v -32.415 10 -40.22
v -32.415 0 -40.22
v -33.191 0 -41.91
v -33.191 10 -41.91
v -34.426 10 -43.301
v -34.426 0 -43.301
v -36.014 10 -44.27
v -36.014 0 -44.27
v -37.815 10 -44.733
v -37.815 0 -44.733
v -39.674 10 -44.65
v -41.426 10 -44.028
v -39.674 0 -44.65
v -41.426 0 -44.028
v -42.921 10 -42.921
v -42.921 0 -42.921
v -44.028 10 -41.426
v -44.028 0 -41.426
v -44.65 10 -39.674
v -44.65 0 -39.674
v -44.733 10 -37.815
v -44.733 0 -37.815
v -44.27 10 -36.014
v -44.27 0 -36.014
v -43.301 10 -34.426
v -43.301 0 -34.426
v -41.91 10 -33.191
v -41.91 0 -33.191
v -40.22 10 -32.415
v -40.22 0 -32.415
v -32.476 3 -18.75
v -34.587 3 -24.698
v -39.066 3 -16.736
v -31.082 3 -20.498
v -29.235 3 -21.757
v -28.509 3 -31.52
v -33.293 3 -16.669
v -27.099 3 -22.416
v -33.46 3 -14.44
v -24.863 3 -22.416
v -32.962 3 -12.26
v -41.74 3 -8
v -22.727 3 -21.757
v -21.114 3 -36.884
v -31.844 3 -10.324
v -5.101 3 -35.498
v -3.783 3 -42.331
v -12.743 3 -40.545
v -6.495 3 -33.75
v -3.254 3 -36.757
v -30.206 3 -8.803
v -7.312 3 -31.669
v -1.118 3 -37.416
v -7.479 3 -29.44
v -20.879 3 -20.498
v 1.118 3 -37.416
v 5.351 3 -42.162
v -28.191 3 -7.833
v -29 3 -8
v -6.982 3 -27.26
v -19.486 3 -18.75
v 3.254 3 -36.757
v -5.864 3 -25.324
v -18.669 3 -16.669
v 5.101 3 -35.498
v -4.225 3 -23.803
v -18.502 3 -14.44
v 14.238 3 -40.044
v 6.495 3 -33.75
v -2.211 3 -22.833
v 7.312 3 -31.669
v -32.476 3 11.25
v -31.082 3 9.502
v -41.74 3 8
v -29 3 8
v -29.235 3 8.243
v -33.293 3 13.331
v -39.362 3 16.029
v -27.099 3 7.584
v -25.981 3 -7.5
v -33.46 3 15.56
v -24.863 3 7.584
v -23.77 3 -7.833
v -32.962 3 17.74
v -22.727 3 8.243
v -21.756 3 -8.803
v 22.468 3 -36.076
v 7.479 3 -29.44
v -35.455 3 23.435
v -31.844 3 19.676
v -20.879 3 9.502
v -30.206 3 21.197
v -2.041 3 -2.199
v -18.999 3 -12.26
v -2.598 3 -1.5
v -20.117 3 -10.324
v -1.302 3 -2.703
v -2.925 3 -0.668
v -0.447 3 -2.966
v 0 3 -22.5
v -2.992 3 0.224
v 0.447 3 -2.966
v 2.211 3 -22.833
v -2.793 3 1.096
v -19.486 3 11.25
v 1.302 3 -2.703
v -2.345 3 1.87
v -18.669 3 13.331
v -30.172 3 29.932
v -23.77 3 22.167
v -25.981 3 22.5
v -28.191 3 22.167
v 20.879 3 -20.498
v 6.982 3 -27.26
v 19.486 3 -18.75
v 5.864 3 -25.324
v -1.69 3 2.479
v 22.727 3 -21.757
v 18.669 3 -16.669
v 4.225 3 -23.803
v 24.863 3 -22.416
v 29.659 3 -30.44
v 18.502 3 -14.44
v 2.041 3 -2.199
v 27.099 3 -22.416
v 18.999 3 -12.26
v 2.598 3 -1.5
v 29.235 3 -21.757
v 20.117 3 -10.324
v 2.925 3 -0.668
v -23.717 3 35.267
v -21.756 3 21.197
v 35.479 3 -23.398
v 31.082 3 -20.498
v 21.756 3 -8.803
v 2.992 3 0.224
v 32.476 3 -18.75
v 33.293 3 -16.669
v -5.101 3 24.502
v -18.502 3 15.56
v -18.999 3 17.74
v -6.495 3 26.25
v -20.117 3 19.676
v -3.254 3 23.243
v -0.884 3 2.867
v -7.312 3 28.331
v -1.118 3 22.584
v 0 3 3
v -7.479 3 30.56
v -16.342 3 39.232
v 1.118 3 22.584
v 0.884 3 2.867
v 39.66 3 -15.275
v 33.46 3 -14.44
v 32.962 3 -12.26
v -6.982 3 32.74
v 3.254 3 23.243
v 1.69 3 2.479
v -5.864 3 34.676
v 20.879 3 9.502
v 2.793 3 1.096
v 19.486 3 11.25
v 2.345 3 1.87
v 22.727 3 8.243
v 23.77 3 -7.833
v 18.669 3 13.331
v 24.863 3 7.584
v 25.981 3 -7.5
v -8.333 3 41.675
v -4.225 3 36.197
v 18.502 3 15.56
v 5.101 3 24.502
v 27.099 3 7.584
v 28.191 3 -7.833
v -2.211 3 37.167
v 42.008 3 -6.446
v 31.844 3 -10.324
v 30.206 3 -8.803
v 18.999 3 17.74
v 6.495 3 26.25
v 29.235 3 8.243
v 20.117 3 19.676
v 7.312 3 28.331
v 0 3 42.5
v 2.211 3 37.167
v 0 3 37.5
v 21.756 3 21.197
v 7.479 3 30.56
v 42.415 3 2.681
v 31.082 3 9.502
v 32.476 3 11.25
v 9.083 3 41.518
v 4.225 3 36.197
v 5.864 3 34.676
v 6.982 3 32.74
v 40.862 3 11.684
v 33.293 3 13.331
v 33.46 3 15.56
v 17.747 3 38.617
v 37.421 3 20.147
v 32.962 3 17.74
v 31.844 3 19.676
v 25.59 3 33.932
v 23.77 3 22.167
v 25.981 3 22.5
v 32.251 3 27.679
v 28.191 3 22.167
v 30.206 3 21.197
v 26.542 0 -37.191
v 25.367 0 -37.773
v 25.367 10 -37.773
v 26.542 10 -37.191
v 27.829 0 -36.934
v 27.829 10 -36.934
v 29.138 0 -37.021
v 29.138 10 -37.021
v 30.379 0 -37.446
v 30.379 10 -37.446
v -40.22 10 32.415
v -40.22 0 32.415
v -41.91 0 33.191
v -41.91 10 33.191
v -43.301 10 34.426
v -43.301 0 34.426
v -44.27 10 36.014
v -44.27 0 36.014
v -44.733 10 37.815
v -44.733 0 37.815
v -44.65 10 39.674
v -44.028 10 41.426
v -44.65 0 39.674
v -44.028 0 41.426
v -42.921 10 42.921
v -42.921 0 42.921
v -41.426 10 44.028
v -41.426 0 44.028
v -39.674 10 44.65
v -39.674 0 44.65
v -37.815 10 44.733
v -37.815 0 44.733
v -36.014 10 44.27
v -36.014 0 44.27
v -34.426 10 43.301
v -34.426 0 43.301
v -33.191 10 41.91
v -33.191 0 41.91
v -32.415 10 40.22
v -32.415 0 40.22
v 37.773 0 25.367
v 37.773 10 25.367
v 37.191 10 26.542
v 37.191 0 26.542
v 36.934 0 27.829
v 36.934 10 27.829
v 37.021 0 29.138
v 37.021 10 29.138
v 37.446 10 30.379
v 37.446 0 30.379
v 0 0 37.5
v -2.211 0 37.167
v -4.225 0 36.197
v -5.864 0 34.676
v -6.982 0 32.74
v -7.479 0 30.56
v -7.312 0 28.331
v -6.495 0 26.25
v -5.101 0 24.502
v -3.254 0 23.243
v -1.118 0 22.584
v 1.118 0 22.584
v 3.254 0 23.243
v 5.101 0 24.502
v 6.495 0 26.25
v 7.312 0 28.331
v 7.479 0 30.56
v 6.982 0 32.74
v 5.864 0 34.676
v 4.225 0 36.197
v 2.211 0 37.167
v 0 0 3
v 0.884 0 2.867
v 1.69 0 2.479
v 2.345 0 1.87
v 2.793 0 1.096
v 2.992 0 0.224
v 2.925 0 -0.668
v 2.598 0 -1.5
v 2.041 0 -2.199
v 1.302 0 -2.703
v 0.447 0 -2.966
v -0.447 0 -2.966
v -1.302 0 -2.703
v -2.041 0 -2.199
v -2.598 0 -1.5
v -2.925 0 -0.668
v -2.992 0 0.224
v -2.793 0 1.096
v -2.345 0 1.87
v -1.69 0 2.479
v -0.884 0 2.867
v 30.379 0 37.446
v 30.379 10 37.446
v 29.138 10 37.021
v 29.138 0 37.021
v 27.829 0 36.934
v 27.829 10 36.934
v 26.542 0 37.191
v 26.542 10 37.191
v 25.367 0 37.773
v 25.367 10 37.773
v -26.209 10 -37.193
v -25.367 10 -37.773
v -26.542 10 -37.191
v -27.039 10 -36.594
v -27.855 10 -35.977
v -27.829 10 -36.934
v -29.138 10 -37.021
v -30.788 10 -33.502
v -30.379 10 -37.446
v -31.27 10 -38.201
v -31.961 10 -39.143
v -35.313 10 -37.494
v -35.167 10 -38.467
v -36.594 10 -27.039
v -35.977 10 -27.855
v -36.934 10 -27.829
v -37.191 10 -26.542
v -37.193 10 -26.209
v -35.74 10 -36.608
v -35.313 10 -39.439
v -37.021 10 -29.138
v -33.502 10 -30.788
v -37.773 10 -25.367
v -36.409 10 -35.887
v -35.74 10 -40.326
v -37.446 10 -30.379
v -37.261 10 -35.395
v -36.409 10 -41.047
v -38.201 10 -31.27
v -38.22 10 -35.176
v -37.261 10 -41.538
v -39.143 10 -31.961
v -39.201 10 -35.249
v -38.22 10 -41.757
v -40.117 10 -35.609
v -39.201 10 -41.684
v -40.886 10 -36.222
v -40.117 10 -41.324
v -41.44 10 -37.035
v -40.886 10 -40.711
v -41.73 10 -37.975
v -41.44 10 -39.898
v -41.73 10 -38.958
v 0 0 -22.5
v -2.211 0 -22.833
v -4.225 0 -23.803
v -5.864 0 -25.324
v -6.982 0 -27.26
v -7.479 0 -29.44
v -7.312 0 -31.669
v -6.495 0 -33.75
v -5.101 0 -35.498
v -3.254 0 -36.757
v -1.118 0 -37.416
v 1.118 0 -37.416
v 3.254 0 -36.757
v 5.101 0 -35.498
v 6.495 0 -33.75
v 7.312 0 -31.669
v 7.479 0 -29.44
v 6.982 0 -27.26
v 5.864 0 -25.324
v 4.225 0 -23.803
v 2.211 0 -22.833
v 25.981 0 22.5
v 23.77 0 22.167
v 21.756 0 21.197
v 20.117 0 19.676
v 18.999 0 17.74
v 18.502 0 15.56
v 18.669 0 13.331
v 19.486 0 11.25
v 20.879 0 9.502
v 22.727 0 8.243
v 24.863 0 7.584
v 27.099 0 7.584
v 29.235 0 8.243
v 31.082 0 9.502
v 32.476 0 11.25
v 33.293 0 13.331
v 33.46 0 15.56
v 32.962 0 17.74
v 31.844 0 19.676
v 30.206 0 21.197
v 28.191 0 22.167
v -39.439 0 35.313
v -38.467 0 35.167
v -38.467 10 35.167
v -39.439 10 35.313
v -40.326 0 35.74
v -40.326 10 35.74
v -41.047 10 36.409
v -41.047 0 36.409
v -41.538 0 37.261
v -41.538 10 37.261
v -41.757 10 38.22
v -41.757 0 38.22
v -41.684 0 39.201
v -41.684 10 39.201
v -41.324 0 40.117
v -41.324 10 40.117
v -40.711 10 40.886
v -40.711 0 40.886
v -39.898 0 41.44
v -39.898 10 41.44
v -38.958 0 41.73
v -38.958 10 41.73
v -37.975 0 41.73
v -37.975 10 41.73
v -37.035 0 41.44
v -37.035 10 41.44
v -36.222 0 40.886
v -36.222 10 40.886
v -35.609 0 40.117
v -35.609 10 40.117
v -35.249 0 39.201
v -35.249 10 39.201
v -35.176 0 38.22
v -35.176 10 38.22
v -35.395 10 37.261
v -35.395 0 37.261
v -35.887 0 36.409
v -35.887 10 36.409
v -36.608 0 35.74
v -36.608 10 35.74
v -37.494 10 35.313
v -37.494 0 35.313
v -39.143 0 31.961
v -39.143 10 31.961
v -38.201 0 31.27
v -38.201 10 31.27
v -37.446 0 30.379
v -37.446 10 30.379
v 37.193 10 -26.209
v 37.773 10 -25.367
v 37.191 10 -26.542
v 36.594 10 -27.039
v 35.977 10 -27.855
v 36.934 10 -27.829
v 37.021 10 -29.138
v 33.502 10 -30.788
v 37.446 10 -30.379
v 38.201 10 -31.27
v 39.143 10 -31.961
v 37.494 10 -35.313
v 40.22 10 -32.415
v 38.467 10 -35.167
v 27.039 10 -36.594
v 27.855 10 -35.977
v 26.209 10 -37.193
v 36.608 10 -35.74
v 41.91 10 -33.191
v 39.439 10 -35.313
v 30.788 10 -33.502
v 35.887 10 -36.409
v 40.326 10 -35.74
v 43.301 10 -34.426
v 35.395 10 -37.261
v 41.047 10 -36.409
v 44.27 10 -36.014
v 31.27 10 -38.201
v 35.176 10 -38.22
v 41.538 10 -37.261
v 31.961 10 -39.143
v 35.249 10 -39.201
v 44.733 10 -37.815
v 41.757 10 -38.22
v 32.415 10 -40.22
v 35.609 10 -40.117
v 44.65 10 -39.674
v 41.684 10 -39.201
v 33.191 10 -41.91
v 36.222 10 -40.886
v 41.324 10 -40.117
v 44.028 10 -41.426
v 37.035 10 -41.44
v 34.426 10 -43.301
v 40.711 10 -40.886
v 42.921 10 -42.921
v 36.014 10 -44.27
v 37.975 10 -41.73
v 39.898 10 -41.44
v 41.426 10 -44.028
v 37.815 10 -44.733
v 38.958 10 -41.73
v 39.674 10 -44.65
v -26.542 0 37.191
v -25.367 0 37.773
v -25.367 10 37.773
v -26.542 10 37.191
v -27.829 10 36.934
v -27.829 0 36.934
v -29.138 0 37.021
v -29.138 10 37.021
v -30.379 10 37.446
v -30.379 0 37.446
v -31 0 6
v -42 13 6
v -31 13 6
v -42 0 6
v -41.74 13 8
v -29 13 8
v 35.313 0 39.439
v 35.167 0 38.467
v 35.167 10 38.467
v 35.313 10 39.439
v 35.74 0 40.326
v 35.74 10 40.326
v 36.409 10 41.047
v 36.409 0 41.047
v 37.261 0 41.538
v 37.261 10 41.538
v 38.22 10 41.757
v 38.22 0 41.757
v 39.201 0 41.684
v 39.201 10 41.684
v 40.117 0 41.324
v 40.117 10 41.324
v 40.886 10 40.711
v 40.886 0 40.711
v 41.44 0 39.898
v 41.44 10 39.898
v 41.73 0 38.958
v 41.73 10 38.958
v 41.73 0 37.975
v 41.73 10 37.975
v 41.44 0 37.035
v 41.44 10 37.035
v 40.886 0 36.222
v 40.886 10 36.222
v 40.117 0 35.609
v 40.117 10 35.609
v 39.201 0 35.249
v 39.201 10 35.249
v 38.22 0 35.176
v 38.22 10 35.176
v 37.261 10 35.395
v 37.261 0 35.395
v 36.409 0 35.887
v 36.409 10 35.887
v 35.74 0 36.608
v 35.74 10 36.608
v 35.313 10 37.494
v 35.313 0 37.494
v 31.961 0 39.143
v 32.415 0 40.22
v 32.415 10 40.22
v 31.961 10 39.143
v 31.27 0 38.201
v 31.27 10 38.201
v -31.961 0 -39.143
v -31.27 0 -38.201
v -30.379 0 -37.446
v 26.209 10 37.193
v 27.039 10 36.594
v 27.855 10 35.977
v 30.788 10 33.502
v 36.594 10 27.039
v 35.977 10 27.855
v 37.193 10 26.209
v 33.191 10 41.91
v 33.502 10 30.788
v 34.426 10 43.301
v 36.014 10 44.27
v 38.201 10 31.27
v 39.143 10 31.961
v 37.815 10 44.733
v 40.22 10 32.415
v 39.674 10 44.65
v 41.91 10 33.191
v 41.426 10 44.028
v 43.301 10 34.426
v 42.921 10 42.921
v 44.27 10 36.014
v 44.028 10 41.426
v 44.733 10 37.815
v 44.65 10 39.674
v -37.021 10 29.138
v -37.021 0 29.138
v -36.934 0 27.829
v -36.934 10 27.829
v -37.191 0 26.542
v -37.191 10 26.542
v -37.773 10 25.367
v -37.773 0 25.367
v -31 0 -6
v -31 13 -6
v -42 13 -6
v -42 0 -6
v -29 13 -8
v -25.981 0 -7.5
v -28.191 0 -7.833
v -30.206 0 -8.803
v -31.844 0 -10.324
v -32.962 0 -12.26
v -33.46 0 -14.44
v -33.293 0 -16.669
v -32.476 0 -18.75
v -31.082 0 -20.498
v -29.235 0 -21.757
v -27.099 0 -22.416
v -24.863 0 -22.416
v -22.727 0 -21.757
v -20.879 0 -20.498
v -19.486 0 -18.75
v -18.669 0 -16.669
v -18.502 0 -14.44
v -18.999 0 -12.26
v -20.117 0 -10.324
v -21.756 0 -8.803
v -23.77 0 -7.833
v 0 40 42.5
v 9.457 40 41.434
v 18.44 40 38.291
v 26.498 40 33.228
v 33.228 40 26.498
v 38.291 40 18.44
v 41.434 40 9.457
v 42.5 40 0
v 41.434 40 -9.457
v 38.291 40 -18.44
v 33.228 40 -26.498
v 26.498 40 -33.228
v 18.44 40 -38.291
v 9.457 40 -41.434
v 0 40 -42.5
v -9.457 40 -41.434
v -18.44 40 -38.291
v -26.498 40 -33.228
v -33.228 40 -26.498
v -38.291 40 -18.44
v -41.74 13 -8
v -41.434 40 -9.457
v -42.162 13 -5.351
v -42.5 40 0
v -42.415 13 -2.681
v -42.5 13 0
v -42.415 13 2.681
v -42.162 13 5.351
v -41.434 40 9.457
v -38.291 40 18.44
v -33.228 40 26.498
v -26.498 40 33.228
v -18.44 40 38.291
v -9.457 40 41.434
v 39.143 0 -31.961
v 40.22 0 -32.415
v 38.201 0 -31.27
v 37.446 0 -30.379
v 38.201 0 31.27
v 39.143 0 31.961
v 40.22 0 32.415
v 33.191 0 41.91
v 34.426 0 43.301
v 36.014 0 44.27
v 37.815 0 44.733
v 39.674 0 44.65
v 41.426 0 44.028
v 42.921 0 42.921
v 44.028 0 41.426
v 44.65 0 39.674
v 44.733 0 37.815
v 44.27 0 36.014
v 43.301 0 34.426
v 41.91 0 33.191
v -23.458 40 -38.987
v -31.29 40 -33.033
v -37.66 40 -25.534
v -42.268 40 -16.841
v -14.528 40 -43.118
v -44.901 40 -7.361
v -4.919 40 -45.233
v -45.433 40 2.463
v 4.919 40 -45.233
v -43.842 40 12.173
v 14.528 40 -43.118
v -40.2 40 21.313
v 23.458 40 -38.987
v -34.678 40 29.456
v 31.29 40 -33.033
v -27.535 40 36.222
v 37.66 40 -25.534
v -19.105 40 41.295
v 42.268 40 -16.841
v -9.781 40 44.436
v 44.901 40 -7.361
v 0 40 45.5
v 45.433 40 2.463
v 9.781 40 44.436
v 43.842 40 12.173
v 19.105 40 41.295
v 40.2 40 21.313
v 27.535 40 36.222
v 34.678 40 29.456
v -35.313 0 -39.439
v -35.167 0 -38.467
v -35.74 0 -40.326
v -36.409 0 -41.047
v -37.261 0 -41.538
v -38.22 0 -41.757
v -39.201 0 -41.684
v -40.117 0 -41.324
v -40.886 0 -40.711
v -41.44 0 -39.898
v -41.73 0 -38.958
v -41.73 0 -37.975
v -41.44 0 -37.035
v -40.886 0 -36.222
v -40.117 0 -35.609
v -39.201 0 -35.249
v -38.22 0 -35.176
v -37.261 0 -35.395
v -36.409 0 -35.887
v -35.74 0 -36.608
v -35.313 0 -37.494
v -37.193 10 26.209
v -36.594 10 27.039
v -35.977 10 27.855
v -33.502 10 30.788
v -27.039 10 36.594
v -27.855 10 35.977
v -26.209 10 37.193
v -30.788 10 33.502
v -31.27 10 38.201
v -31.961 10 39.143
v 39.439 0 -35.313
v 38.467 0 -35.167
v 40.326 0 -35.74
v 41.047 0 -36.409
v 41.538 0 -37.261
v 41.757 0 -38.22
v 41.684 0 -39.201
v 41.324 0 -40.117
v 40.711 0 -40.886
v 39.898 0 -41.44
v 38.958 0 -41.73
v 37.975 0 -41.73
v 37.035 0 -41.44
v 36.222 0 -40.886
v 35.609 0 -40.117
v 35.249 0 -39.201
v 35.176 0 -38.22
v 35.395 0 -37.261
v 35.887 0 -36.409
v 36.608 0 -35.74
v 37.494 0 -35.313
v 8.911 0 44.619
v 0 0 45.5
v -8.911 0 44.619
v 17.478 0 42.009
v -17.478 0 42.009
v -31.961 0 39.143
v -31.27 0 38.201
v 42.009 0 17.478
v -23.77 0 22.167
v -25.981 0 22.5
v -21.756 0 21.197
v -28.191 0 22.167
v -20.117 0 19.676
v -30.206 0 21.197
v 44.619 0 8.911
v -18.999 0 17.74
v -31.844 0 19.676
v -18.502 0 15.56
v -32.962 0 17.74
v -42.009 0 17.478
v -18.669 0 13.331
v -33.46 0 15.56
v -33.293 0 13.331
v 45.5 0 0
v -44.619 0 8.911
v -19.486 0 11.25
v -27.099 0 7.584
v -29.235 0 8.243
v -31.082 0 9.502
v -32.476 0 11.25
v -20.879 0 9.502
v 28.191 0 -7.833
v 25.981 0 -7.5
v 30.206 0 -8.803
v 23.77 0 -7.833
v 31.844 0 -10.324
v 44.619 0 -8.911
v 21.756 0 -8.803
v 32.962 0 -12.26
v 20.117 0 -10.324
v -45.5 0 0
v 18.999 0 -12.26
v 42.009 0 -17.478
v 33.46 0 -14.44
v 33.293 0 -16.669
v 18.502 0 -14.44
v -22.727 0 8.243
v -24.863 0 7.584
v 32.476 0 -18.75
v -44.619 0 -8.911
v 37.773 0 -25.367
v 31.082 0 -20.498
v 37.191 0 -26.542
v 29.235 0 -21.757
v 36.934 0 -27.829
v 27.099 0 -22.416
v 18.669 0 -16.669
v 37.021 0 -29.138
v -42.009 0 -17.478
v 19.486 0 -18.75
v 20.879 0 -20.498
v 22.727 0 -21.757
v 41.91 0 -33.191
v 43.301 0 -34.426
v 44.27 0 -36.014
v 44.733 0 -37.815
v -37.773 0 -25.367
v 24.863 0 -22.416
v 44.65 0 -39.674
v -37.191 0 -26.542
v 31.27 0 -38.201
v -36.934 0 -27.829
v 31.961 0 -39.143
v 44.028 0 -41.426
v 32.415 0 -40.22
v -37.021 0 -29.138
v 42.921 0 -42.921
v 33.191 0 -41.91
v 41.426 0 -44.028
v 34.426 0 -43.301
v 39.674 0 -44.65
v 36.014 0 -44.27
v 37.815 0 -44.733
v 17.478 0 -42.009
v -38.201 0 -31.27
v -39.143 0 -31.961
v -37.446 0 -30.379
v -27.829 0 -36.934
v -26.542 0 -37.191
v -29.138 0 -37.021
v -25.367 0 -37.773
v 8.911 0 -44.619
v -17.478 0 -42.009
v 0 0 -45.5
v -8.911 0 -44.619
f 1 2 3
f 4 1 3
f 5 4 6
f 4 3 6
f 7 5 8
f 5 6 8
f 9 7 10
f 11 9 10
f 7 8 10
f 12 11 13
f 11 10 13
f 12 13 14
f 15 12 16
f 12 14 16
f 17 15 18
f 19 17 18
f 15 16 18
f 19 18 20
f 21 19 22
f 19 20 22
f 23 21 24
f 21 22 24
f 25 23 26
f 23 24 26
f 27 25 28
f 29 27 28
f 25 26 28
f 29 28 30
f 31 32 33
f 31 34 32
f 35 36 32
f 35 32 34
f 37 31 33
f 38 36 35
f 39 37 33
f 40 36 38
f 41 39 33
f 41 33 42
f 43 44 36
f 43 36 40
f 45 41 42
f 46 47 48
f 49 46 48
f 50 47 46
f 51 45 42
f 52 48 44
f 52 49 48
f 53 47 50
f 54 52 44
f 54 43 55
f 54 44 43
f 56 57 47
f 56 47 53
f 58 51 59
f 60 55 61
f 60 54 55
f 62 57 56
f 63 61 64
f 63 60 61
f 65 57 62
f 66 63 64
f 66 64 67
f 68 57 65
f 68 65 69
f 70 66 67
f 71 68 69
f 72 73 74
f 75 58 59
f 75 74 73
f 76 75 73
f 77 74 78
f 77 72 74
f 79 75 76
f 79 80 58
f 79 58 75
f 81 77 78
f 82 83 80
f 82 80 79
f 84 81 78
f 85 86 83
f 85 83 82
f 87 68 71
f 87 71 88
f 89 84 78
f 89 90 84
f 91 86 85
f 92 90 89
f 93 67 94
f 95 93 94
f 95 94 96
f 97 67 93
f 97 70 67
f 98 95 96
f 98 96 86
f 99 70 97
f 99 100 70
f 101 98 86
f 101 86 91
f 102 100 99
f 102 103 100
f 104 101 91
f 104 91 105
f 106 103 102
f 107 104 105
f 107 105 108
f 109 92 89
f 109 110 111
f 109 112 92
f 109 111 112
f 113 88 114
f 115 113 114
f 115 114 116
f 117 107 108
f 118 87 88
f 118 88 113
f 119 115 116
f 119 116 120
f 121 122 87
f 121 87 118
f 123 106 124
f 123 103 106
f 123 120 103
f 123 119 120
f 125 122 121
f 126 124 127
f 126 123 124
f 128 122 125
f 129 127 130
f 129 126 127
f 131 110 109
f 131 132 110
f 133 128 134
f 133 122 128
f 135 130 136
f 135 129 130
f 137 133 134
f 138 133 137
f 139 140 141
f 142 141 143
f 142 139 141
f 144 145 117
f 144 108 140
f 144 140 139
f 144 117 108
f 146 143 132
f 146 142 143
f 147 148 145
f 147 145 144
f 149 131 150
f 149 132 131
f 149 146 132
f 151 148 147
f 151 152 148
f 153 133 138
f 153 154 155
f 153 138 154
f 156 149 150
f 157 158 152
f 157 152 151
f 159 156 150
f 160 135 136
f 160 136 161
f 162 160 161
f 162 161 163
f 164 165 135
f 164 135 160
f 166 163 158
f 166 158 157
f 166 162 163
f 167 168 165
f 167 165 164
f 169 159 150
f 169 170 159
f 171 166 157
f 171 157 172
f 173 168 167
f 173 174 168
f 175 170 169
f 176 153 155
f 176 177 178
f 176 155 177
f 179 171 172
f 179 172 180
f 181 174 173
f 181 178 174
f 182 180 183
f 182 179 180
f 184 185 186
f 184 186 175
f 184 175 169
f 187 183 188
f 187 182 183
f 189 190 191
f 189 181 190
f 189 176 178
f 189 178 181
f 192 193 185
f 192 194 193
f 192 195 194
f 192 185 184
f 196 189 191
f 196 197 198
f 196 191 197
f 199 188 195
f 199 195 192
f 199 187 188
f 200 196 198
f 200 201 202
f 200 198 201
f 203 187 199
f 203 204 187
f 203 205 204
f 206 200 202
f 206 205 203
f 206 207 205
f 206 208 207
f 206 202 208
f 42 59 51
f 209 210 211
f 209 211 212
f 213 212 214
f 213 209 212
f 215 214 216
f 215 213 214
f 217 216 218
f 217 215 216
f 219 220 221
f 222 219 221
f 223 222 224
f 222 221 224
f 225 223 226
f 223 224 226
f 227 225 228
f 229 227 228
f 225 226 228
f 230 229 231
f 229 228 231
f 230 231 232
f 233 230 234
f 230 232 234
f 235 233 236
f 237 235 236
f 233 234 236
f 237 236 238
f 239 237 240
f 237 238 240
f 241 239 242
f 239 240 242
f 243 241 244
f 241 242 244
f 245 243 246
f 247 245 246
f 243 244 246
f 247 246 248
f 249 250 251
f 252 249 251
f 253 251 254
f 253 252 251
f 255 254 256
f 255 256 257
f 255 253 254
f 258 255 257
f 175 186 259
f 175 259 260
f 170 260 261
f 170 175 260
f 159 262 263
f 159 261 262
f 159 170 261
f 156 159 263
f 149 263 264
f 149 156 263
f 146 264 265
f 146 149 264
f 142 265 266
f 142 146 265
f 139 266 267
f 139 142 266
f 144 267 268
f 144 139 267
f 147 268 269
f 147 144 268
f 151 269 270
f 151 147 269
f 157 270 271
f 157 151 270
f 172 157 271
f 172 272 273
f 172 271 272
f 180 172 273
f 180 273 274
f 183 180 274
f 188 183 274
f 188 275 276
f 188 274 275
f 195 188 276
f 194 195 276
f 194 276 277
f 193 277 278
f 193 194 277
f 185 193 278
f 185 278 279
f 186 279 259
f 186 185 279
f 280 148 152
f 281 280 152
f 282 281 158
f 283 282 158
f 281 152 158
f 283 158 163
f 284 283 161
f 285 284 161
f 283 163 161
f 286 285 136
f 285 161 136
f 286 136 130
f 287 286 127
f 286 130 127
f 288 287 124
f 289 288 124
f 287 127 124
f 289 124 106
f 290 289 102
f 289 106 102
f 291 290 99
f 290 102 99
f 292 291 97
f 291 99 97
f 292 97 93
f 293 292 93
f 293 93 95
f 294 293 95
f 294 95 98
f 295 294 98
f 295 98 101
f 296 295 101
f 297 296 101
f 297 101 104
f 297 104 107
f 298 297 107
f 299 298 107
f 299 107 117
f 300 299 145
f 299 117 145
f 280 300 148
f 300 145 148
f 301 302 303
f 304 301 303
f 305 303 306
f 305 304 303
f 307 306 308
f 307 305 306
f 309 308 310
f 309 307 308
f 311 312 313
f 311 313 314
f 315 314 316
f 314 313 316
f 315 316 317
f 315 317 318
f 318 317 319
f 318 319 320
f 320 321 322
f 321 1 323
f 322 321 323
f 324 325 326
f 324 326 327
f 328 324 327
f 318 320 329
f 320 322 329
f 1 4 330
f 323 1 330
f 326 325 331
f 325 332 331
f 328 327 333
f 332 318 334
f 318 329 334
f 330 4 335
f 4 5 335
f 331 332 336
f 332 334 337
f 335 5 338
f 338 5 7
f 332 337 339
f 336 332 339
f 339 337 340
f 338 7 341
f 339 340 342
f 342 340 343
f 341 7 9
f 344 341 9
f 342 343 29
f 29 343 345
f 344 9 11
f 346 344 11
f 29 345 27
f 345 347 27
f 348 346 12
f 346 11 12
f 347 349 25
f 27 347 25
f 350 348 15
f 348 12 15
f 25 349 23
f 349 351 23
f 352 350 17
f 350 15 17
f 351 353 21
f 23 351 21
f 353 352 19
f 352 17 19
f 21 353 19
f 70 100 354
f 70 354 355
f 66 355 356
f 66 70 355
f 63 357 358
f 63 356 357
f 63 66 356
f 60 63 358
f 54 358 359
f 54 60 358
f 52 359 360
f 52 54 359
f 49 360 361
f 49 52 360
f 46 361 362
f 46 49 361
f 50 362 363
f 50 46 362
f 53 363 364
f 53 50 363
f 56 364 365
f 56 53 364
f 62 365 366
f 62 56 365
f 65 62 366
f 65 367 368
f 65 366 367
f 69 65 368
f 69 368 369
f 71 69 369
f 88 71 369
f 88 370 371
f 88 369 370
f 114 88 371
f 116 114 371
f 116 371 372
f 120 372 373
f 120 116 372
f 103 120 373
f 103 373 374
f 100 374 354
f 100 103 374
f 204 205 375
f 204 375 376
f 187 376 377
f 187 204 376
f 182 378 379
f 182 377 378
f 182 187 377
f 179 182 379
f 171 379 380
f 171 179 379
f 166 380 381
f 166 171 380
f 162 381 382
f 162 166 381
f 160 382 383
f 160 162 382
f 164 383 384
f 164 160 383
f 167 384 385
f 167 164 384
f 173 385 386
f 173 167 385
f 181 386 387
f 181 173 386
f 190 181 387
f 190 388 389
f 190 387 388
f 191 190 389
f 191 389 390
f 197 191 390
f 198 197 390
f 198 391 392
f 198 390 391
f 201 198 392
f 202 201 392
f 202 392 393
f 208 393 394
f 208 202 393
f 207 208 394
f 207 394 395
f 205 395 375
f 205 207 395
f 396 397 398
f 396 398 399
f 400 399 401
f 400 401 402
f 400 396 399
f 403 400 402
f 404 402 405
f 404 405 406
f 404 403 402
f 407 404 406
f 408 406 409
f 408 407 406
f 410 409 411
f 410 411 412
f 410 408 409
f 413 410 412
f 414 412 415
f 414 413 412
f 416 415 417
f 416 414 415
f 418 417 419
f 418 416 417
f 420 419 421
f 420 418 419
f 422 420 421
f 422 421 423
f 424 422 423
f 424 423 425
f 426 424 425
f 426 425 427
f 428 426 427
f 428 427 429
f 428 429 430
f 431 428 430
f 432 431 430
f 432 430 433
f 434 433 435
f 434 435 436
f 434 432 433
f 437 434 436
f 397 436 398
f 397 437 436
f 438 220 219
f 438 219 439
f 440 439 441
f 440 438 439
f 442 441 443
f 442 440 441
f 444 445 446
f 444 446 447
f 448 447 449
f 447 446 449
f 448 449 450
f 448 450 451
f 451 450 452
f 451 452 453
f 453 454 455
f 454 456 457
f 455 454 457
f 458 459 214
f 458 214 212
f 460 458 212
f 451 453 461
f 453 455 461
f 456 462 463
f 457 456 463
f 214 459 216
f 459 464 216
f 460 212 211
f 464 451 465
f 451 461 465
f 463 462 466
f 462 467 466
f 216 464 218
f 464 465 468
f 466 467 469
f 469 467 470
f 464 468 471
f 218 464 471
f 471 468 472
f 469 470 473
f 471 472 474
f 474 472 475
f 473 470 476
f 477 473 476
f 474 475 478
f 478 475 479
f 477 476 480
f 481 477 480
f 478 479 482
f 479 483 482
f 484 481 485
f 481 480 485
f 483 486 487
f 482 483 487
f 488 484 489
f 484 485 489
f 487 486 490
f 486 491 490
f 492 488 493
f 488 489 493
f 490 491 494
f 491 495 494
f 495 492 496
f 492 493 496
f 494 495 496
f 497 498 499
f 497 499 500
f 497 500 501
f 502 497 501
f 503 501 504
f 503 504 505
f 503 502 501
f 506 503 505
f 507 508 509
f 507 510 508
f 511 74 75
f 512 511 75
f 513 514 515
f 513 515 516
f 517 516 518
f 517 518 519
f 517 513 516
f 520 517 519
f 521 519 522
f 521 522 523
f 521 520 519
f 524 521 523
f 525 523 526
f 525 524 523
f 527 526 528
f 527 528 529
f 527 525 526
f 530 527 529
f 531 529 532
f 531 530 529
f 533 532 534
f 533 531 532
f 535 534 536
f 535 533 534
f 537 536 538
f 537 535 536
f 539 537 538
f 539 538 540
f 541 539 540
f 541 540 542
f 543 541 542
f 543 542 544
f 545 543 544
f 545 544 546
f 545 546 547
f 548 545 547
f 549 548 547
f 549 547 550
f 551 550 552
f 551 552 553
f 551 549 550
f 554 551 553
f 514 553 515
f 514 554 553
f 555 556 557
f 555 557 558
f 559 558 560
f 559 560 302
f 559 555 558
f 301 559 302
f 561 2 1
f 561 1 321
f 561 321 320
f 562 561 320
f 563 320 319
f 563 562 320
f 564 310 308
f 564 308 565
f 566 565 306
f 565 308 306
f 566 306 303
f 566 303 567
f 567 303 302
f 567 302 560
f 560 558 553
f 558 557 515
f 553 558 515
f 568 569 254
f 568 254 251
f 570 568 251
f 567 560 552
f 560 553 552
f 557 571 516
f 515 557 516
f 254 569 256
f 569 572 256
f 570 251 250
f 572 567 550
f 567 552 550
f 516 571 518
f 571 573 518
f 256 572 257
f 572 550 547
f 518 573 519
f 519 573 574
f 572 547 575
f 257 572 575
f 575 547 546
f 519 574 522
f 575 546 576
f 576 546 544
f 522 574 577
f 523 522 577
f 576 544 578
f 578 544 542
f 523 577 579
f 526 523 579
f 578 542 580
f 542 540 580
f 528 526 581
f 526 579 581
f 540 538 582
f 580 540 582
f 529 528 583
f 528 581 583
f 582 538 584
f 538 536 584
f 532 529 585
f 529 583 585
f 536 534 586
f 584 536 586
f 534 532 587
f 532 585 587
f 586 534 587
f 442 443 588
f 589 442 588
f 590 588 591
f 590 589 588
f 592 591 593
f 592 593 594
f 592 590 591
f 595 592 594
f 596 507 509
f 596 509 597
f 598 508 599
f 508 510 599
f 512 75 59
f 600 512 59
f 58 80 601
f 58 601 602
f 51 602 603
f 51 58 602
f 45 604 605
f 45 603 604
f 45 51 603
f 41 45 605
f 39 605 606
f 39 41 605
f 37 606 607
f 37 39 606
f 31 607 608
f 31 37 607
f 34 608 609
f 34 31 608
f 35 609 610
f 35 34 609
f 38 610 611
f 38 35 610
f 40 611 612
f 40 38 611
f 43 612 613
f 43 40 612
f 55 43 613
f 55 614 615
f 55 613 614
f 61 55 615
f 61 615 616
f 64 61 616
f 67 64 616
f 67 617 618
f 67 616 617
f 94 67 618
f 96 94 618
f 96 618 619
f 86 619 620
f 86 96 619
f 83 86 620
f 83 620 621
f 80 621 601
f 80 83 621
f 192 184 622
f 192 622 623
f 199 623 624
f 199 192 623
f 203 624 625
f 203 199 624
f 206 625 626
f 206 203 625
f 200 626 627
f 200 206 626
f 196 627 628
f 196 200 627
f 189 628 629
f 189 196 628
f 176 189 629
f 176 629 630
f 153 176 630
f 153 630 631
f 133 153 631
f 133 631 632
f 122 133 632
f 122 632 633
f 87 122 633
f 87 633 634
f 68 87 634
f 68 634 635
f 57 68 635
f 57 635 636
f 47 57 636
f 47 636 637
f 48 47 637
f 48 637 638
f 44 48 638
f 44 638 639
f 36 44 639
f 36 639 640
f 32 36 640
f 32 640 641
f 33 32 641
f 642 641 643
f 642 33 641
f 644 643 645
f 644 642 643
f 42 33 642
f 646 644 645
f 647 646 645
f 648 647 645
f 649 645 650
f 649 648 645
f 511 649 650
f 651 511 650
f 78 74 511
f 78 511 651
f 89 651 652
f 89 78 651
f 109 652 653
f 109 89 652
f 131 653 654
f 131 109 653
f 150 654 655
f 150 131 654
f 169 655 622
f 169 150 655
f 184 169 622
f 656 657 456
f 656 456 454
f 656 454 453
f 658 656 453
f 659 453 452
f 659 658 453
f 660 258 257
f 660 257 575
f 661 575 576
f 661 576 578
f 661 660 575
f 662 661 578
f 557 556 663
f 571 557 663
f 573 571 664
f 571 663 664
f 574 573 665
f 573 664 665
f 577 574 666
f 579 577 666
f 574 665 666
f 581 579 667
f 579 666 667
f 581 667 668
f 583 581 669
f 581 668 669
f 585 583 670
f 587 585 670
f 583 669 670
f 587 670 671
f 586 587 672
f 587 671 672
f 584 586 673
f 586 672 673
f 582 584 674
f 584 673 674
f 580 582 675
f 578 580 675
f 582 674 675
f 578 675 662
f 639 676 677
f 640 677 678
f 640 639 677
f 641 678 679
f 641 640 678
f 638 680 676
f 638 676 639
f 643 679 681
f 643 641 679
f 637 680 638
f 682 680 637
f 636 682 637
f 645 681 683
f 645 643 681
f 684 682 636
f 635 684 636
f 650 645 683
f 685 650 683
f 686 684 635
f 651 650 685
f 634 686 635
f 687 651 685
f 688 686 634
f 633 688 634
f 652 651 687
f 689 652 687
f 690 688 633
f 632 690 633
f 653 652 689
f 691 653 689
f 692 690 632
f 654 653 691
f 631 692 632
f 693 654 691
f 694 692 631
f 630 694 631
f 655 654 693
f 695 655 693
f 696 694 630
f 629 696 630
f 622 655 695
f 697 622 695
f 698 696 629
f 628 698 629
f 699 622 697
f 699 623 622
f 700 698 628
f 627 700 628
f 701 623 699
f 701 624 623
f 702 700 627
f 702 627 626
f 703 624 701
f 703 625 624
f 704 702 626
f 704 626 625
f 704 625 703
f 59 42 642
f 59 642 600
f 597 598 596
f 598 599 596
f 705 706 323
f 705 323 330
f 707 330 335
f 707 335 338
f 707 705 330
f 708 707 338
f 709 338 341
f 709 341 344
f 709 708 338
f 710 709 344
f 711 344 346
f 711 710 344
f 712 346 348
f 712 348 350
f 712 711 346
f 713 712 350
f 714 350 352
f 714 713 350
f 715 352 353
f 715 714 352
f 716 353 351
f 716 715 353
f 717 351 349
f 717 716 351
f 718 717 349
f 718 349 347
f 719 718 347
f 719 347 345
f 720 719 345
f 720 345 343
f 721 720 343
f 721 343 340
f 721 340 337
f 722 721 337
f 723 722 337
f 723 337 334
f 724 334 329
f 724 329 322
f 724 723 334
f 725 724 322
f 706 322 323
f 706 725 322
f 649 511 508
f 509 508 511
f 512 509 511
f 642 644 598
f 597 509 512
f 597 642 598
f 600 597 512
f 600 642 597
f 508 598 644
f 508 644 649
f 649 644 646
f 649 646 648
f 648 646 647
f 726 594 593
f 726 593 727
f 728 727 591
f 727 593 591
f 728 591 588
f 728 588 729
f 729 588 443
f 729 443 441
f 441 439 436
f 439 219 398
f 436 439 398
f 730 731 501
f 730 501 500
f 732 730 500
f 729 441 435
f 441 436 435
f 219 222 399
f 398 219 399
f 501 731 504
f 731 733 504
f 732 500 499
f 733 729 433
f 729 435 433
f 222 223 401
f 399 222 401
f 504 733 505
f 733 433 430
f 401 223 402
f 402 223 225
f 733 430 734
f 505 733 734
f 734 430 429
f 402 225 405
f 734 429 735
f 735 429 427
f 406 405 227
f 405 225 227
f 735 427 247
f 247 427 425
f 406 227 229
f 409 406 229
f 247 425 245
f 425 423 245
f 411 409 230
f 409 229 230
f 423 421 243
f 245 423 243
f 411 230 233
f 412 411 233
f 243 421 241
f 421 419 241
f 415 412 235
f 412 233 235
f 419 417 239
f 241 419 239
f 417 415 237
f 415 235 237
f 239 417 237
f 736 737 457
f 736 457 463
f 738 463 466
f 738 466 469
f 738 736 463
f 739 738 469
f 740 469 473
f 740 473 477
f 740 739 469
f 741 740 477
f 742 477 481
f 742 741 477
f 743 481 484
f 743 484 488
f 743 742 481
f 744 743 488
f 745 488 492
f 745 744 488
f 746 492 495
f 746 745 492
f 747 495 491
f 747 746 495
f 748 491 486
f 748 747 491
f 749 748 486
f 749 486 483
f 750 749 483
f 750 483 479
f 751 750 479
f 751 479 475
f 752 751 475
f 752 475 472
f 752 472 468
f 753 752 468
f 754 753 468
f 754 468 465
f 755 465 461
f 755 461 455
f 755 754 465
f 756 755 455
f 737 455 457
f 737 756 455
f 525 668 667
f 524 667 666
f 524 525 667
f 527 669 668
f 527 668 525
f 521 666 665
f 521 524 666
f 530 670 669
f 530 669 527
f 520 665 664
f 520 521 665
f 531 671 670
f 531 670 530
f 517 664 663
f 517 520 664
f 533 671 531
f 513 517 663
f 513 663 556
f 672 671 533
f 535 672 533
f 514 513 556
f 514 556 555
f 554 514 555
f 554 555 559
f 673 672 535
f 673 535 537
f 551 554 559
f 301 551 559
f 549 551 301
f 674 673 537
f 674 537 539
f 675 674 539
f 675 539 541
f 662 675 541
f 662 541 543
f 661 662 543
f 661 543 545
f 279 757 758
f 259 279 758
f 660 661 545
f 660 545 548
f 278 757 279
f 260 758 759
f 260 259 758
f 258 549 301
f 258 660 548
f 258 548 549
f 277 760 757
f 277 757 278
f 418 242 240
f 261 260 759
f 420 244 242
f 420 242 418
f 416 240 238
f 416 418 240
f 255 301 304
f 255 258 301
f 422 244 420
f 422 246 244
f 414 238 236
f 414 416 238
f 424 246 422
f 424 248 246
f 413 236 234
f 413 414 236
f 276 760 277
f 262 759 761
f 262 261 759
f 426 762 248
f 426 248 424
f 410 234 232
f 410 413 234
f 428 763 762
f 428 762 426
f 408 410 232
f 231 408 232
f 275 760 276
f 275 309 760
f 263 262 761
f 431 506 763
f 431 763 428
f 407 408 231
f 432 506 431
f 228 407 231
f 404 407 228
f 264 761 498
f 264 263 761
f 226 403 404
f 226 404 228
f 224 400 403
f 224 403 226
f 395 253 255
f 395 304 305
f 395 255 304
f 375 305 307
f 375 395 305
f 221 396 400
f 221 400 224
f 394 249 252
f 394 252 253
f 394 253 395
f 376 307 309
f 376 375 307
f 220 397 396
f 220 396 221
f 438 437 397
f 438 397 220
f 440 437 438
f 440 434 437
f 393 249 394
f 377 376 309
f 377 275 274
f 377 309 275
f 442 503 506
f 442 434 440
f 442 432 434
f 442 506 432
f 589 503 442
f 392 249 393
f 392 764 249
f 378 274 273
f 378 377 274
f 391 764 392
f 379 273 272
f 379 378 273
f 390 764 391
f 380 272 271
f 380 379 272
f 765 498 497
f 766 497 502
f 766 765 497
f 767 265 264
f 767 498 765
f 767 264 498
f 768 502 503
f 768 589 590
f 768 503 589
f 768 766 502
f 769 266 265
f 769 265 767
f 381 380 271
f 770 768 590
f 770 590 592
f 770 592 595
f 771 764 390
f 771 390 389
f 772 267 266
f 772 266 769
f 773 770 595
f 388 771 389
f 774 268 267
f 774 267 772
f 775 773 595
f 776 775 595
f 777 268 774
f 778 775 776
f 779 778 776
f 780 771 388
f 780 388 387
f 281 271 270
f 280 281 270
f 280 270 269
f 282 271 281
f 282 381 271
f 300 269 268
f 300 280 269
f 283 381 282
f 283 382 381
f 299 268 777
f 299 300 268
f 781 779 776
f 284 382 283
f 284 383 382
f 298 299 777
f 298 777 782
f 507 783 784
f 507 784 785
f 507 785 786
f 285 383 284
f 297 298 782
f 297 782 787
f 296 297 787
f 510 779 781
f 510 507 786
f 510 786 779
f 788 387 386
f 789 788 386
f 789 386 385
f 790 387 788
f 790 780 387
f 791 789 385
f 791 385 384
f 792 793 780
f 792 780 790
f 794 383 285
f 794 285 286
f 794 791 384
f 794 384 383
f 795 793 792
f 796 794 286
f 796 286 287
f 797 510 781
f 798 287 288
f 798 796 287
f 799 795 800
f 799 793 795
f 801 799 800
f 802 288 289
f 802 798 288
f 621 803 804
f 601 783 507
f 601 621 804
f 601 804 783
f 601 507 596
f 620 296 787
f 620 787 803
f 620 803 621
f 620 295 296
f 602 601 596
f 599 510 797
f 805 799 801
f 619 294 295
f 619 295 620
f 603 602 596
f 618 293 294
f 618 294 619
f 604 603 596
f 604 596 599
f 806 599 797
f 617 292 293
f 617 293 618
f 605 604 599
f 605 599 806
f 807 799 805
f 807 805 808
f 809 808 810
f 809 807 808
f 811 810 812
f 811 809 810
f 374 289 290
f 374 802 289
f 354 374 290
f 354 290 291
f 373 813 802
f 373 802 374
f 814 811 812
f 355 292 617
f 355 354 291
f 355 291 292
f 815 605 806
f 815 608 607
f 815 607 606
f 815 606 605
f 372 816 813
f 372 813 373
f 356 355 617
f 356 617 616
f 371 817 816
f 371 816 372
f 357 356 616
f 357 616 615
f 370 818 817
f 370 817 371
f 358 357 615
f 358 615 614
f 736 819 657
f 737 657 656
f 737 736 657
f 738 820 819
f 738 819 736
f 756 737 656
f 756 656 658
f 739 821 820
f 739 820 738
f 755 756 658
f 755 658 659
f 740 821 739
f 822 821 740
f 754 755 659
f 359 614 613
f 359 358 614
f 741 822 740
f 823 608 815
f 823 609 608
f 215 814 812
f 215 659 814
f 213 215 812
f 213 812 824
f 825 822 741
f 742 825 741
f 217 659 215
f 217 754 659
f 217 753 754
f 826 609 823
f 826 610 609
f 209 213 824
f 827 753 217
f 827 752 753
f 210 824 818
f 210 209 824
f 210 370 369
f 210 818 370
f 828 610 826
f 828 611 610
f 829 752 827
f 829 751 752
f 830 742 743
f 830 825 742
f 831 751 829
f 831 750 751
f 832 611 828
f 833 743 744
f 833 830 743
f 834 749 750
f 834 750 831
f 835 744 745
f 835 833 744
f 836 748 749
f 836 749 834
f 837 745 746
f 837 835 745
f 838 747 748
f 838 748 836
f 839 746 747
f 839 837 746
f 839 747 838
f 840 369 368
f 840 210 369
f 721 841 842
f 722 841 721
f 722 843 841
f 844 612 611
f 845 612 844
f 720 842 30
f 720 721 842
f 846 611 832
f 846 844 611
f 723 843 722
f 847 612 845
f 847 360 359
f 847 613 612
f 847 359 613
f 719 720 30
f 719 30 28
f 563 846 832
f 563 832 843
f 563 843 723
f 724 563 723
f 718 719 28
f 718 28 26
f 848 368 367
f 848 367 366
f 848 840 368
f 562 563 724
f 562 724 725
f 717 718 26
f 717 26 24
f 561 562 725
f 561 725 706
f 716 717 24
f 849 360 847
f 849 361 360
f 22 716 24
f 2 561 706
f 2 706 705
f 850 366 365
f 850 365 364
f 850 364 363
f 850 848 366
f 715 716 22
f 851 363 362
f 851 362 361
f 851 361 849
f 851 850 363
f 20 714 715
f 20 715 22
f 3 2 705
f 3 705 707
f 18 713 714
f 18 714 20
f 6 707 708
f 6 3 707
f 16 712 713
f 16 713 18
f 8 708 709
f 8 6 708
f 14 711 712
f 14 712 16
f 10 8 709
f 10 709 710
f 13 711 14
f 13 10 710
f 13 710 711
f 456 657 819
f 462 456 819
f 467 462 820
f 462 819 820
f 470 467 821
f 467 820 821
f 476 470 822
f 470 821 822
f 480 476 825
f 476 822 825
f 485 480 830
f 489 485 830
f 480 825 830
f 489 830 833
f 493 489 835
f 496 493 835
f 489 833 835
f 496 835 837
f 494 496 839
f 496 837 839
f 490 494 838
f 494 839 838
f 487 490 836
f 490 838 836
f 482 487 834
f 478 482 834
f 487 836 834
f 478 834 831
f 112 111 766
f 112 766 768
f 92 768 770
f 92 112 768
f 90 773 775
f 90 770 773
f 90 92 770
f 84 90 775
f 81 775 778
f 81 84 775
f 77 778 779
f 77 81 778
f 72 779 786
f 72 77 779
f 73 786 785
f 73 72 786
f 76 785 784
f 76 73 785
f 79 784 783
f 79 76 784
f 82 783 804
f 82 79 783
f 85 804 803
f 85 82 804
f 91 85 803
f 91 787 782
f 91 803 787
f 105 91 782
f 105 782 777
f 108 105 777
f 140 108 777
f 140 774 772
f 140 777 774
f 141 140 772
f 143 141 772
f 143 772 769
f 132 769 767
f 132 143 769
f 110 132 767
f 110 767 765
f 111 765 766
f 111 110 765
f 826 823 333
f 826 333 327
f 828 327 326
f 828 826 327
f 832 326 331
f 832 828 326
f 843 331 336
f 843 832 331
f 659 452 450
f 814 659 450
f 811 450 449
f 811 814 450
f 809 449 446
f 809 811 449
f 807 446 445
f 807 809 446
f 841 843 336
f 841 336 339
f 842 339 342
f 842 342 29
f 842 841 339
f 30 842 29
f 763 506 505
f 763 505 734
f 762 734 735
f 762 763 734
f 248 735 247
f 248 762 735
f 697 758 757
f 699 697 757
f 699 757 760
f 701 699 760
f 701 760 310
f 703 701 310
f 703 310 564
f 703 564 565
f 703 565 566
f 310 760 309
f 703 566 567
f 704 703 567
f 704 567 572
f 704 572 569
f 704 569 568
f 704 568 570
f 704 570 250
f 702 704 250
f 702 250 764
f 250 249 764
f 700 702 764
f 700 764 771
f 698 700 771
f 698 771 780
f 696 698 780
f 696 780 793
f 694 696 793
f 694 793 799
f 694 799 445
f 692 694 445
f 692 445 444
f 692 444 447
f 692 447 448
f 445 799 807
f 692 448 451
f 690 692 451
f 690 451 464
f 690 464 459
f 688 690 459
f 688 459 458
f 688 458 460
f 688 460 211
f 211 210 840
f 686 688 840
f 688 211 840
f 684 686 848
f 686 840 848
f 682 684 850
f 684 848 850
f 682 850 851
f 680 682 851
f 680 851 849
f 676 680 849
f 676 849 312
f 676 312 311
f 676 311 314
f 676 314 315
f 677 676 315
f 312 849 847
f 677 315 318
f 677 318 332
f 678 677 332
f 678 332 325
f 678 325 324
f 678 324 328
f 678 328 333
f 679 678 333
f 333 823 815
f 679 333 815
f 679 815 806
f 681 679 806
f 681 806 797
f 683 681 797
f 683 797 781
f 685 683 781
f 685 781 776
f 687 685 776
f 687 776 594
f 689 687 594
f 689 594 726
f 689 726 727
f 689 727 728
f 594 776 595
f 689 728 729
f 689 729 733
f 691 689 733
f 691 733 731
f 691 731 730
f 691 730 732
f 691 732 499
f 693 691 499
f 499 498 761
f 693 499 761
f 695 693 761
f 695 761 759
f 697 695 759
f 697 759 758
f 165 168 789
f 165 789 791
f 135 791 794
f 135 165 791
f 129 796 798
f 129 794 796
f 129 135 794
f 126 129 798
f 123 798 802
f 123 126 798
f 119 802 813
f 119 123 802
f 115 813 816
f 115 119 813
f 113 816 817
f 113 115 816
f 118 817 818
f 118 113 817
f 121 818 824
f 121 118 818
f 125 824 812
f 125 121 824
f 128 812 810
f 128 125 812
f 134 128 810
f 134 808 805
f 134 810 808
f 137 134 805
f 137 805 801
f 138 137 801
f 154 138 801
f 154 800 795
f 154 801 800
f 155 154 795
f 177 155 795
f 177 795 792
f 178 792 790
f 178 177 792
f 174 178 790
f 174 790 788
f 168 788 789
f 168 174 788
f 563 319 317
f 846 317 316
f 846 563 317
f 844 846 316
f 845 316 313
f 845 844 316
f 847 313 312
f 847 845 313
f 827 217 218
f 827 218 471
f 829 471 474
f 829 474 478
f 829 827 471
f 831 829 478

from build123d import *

# Parameters (mm, degrees)
SKETCH1_R               = 45.5
BOSS_EXTRUDE1_DEPTH     = 40
SHELL1_T                = -3
CUT_EXTRUDE2_DEPTH      = 76.766087401
CUT_EXTRUDE2_DEPTH_BACK = 76.766087401
SKETCH3_R               = 7.5
SKETCH4_R               = 3
CUT_EXTRUDE3_DEPTH      = 3
SKETCH6_W               = 15
SKETCH6_H               = 16
SKETCH6_W_2             = 11
SKETCH6_H_2             = 12
BOSS_EXTRUDE2_DEPTH     = 10
SKETCH7_W               = 11
SKETCH7_H               = 12
CUT_EXTRUDE5_DEPTH      = 3
SKETCH8_R               = 3.3
BOSS_EXTRUDE3_DEPTH     = 10
CIRPATTERN1_COUNT       = 4
FILLET1_R               = 5


with BuildPart() as part:
    # Sketch1 → Boss-Extrude1 (new body)
    with BuildSketch(Plane(origin=(0, 0, 0), x_dir=(1, 0, 0), z_dir=(0, 1, 0))):
        with Locations(Location((0, 0, 0), (0, 0, 270))):
            Circle(SKETCH1_R)
    extrude(amount=BOSS_EXTRUDE1_DEPTH)

    # Shell1
    shell1_openings = [part.faces().sort_by_distance(p)[0] for p in [
        (0, 40, 0),
    ]]
    offset(amount=SHELL1_T, openings=shell1_openings, kind=Kind.INTERSECTION)

    # Sketch3 → Cut-Extrude2 (cut, two sides: drawn at the far end of the back side and taken through both)
    with BuildSketch(Plane.XZ.offset(-CUT_EXTRUDE2_DEPTH_BACK)):
        with Locations(Location((0, 30, 0), (0, 0, 90))):
            Circle(SKETCH3_R)
        with Locations(Location((25.980762114, 15, 0), (0, 0, 90))):
            Circle(SKETCH3_R)
        with Locations(Location((25.980762114, -15, 0), (0, 0, 90))):
            Circle(SKETCH3_R)
        with Locations(Location((0, -30, 0), (0, 0, 90))):
            Circle(SKETCH3_R)
        with Locations(Location((-25.980762114, -15, 0), (0, 0, 90))):
            Circle(SKETCH3_R)
        with Locations(Location((-25.980762114, 15, 0), (0, 0, 90))):
            Circle(SKETCH3_R)
    extrude(amount=CUT_EXTRUDE2_DEPTH + CUT_EXTRUDE2_DEPTH_BACK, mode=Mode.SUBTRACT)

    # Sketch4 → Cut-Extrude3 (cut)
    with BuildSketch(Plane(origin=(0, 3, 0), x_dir=(1, 0, 0), z_dir=(0, 1, 0))):
        with Locations(Location((0, 0, 0), (0, 0, 270))):
            Circle(SKETCH4_R)
    extrude(amount=-CUT_EXTRUDE3_DEPTH, mode=Mode.SUBTRACT)

    # Sketch6 → Boss-Extrude2 (add)
    with BuildSketch(Plane(origin=(0, 3, 0), x_dir=(1, 0, 0), z_dir=(0, 1, 0))):
        with Locations((-36.5, 0)):
            Rectangle(SKETCH6_W, SKETCH6_H)
        with Locations((-36.5, 0)):
            Rectangle(SKETCH6_W_2, SKETCH6_H_2, mode=Mode.SUBTRACT)
    extrude(amount=BOSS_EXTRUDE2_DEPTH)

    # Sketch7 → Cut-Extrude5 (cut)
    with BuildSketch(Plane(origin=(0, 3, 0), x_dir=(1, 0, 0), z_dir=(0, 1, 0))):
        with Locations((-36.5, 0)):
            Rectangle(SKETCH7_W, SKETCH7_H)
    extrude(amount=-CUT_EXTRUDE5_DEPTH, mode=Mode.SUBTRACT)

    # Sketch8 → Boss-Extrude3 (add)
    with BuildSketch(Plane(origin=(0, 0, 0), x_dir=(1, 0, 0), z_dir=(0, 1, 0))):
        with BuildLine():
            Line((32.166608897, 38.466608897), (27.854823504, 35.97719844))
            ThreePointArc((27.854823504, 35.97719844), (32.173358544, 32.173358544), (35.97719844, 27.854823504))
            Line((35.97719844, 27.854823504), (38.466608897, 32.166608897))
            ThreePointArc((38.466608897, 32.166608897), (42.921381618, 42.921381618), (32.166608897, 38.466608897))
        make_face()
        with Locations(Location((38.466608897, 38.466608897, 0), (0, 0, 270))):
            Circle(SKETCH8_R, mode=Mode.SUBTRACT)
    boss_extrude3 = extrude(amount=BOSS_EXTRUDE3_DEPTH)

    # CirPattern1: Boss-Extrude3 ×4 about axis
    cirpattern1_axis = Axis((0, 0, 0), (0, 1, 0))
    for i in range(1, CIRPATTERN1_COUNT):
        add(boss_extrude3.rotate(cirpattern1_axis, i * 360 / CIRPATTERN1_COUNT))

    # Fillet1
    # the kernel refuses this fillet: 5 mm, written as the material it adds along each edge
    with BuildSketch(Plane(origin=(-38.466608897, 0, 32.166608897), x_dir=(0.5000000000000063, 0, -0.866025403784435), z_dir=(0, 1, 0)), Plane(origin=(32.166608897, 0, 38.466608897), x_dir=(-0.8660254037844374, 0, -0.5000000000000022), z_dir=(0, 1, 0)), Plane(origin=(38.466608897, 0, -32.166608897), x_dir=(-0.5000000000000032, 0, 0.8660254037844368), z_dir=(0, 1, 0)), Plane(origin=(-32.166608897, 0, -38.466608897), x_dir=(0.8660254037844356, 0, 0.5000000000000054), z_dir=(0, 1, 0))) as fillet1_piece_1:
        with BuildLine():
            CenterArc((2.371395832, 5), FILLET1_R, 226.156864412, 43.843135588)
            ThreePointArc((-1.092035972, 1.39380531), (-0.496806454, 0.735459519), (0, 0))
            Line((0, 0), (2.371395832, 0))
        make_face()
    extrude(amount=10)
    with BuildSketch(Plane(origin=(-32.166608897, 0, 38.466608897), x_dir=(0.8660254037844327, 0, -0.5000000000000103), z_dir=(0, 1, 0)), Plane(origin=(38.466608897, 0, 32.166608897), x_dir=(-0.5000000000000117, 0, -0.8660254037844319), z_dir=(0, 1, 0)), Plane(origin=(32.166608897, 0, -38.466608897), x_dir=(-0.8660254037844319, 0, 0.5000000000000117), z_dir=(0, 1, 0)), Plane(origin=(-38.466608897, 0, -32.166608897), x_dir=(0.500000000000011, 0, 0.8660254037844324), z_dir=(0, 1, 0))) as fillet1_piece_2:
        with BuildLine():
            CenterArc((2.371395832, -5), FILLET1_R, 90, 43.843135588)
            ThreePointArc((-1.092035972, -1.39380531), (-0.496806454, -0.735459519), (0, 0))
            Line((0, 0), (2.371395832, 0))
        make_face()
    extrude(amount=10)
    with BuildSketch(Plane(origin=(-27.854823504, 0, 35.97719844), x_dir=(0.8108999282777639, 0, 0.5851848479917412), z_dir=(0, 1, 0)), Plane(origin=(35.97719844, 0, 27.854823504), x_dir=(0.5851848479917567, 0, -0.8108999282777527), z_dir=(0, 1, 0)), Plane(origin=(27.854823504, 0, -35.97719844), x_dir=(-0.8108999282777679, 0, -0.5851848479917359), z_dir=(0, 1, 0)), Plane(origin=(-35.97719844, 0, -27.854823504), x_dir=(-0.5851848479917252, 0, 0.8108999282777755), z_dir=(0, 1, 0))) as fillet1_piece_3:
        with BuildLine():
            CenterArc((3.236915302, -4.997156955), FILLET1_R, 91.932257762, 63.883791986)
            Line((-1.32425924, -2.948819386), (0, 0))
            ThreePointArc((0, 0), (1.534162982, -0.025871708), (3.068325963, 0))
        make_face()
    extrude(amount=10)
    with BuildSketch(Plane(origin=(-35.97719844, 0, 27.854823504), x_dir=(-0.5851848479917389, 0, -0.8108999282777657), z_dir=(0, 1, 0)), Plane(origin=(27.854823504, 0, 35.97719844), x_dir=(-0.8108999282777541, 0, 0.5851848479917549), z_dir=(0, 1, 0)), Plane(origin=(35.97719844, 0, -27.854823504), x_dir=(0.5851848479917436, 0, 0.8108999282777621), z_dir=(0, 1, 0)), Plane(origin=(-27.854823504, 0, -35.97719844), x_dir=(0.8108999282777745, 0, -0.5851848479917268), z_dir=(0, 1, 0))) as fillet1_piece_4:
        with BuildLine():
            CenterArc((3.236915302, 4.997156955), FILLET1_R, 204.183950253, 63.883791986)
            Line((-1.32425924, 2.948819386), (0, 0))
            ThreePointArc((0, 0), (1.534162982, 0.025871708), (3.068325963, 0))
        make_face()
    extrude(amount=10)


solid = part.part
